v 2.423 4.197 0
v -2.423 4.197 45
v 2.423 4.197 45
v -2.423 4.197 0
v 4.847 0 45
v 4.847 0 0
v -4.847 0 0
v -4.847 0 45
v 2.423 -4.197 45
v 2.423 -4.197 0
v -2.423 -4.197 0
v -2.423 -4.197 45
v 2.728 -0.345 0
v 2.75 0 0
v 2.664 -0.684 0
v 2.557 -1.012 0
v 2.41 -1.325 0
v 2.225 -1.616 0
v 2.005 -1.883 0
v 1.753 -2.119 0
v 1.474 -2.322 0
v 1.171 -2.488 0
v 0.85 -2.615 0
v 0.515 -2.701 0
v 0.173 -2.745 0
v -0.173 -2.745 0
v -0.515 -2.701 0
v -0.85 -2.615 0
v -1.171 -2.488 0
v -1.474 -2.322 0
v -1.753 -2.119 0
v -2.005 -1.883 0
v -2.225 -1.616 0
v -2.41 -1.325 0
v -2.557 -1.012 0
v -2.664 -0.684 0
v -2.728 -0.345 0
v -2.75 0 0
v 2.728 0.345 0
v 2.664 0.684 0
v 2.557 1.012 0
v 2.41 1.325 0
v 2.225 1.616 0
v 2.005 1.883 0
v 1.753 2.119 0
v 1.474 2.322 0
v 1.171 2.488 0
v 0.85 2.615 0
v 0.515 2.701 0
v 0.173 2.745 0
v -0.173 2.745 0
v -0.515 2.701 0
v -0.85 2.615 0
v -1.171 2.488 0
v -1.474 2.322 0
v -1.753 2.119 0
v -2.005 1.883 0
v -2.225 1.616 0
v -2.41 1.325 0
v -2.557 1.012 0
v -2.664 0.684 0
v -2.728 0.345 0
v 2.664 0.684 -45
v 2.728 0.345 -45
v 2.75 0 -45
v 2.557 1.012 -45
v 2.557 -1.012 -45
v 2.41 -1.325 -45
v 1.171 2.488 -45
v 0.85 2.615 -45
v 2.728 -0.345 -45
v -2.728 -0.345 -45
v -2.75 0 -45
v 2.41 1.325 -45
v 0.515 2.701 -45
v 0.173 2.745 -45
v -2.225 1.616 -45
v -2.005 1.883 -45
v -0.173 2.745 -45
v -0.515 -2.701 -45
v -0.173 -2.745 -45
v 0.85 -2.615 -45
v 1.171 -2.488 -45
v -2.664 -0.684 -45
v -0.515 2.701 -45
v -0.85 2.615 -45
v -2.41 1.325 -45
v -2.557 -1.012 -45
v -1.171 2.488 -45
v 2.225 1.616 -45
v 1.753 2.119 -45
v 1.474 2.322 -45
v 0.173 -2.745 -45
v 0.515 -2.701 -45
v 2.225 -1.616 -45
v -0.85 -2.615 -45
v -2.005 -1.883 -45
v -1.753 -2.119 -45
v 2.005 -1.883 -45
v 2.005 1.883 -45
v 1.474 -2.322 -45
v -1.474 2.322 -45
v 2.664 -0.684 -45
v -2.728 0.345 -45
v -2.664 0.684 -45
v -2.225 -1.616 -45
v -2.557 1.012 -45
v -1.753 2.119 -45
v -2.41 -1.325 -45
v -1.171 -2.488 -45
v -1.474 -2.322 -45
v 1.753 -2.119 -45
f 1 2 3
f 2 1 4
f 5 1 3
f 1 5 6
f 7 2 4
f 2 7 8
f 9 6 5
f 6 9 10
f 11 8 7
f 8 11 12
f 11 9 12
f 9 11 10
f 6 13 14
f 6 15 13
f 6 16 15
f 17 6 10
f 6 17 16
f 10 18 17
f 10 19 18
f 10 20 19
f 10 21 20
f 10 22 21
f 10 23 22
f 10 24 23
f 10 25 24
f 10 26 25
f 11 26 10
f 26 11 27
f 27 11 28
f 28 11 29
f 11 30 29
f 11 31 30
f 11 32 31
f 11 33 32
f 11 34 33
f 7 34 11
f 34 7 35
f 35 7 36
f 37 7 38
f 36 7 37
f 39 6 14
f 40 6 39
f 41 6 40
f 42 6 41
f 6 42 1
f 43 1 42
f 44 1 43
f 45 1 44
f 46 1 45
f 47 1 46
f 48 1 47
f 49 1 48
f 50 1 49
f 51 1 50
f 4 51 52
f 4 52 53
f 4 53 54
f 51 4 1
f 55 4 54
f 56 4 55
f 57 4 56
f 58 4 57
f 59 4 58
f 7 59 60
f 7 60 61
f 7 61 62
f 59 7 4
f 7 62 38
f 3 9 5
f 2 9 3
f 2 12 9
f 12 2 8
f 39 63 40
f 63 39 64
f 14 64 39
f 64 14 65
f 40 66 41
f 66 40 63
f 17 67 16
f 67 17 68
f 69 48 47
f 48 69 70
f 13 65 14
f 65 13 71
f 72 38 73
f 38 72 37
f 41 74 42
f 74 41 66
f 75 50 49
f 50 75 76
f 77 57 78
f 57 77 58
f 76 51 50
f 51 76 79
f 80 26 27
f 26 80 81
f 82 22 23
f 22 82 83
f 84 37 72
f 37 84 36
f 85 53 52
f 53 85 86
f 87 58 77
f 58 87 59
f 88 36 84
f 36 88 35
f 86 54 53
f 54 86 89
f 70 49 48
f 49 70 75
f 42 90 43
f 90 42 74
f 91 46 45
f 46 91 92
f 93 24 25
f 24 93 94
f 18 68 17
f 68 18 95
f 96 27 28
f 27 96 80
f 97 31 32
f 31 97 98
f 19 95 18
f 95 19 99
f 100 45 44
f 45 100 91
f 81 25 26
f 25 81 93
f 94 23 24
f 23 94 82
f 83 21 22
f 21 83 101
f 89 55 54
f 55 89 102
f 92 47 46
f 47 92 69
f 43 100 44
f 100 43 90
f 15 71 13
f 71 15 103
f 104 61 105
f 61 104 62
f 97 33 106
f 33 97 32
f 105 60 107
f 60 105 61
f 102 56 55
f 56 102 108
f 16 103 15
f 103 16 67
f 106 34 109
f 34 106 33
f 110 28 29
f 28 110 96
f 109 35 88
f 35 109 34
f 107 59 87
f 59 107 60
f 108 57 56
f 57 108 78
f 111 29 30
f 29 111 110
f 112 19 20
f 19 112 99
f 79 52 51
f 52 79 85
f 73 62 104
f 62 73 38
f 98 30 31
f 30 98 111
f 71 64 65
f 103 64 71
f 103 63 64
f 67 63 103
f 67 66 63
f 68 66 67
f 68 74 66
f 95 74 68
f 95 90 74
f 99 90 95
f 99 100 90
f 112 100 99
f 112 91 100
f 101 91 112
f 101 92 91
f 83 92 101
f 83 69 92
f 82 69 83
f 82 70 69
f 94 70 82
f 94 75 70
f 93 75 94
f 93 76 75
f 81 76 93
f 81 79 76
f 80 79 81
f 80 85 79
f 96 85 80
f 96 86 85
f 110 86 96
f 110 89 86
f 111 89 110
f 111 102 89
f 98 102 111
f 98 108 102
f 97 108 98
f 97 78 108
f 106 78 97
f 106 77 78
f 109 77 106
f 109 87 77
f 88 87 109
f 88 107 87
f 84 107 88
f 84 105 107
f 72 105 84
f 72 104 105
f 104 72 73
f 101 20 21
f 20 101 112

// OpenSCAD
$fn = 50;


difference() {
	union() {
		linear_extrude(height = 45) {
			polygon(points = [[4.8468000000, 0.0000000000], [2.4234000000, 4.1974519271], [-2.4234000000, 4.1974519271], [-4.8468000000, 0.0000000000], [-2.4234000000, -4.1974519271], [2.4234000000, -4.1974519271]]);
		}
		translate(v = [0, 0, -45]) {
			cylinder(h = 45, r = 2.7500000000);
		}
	}
	union();
}
